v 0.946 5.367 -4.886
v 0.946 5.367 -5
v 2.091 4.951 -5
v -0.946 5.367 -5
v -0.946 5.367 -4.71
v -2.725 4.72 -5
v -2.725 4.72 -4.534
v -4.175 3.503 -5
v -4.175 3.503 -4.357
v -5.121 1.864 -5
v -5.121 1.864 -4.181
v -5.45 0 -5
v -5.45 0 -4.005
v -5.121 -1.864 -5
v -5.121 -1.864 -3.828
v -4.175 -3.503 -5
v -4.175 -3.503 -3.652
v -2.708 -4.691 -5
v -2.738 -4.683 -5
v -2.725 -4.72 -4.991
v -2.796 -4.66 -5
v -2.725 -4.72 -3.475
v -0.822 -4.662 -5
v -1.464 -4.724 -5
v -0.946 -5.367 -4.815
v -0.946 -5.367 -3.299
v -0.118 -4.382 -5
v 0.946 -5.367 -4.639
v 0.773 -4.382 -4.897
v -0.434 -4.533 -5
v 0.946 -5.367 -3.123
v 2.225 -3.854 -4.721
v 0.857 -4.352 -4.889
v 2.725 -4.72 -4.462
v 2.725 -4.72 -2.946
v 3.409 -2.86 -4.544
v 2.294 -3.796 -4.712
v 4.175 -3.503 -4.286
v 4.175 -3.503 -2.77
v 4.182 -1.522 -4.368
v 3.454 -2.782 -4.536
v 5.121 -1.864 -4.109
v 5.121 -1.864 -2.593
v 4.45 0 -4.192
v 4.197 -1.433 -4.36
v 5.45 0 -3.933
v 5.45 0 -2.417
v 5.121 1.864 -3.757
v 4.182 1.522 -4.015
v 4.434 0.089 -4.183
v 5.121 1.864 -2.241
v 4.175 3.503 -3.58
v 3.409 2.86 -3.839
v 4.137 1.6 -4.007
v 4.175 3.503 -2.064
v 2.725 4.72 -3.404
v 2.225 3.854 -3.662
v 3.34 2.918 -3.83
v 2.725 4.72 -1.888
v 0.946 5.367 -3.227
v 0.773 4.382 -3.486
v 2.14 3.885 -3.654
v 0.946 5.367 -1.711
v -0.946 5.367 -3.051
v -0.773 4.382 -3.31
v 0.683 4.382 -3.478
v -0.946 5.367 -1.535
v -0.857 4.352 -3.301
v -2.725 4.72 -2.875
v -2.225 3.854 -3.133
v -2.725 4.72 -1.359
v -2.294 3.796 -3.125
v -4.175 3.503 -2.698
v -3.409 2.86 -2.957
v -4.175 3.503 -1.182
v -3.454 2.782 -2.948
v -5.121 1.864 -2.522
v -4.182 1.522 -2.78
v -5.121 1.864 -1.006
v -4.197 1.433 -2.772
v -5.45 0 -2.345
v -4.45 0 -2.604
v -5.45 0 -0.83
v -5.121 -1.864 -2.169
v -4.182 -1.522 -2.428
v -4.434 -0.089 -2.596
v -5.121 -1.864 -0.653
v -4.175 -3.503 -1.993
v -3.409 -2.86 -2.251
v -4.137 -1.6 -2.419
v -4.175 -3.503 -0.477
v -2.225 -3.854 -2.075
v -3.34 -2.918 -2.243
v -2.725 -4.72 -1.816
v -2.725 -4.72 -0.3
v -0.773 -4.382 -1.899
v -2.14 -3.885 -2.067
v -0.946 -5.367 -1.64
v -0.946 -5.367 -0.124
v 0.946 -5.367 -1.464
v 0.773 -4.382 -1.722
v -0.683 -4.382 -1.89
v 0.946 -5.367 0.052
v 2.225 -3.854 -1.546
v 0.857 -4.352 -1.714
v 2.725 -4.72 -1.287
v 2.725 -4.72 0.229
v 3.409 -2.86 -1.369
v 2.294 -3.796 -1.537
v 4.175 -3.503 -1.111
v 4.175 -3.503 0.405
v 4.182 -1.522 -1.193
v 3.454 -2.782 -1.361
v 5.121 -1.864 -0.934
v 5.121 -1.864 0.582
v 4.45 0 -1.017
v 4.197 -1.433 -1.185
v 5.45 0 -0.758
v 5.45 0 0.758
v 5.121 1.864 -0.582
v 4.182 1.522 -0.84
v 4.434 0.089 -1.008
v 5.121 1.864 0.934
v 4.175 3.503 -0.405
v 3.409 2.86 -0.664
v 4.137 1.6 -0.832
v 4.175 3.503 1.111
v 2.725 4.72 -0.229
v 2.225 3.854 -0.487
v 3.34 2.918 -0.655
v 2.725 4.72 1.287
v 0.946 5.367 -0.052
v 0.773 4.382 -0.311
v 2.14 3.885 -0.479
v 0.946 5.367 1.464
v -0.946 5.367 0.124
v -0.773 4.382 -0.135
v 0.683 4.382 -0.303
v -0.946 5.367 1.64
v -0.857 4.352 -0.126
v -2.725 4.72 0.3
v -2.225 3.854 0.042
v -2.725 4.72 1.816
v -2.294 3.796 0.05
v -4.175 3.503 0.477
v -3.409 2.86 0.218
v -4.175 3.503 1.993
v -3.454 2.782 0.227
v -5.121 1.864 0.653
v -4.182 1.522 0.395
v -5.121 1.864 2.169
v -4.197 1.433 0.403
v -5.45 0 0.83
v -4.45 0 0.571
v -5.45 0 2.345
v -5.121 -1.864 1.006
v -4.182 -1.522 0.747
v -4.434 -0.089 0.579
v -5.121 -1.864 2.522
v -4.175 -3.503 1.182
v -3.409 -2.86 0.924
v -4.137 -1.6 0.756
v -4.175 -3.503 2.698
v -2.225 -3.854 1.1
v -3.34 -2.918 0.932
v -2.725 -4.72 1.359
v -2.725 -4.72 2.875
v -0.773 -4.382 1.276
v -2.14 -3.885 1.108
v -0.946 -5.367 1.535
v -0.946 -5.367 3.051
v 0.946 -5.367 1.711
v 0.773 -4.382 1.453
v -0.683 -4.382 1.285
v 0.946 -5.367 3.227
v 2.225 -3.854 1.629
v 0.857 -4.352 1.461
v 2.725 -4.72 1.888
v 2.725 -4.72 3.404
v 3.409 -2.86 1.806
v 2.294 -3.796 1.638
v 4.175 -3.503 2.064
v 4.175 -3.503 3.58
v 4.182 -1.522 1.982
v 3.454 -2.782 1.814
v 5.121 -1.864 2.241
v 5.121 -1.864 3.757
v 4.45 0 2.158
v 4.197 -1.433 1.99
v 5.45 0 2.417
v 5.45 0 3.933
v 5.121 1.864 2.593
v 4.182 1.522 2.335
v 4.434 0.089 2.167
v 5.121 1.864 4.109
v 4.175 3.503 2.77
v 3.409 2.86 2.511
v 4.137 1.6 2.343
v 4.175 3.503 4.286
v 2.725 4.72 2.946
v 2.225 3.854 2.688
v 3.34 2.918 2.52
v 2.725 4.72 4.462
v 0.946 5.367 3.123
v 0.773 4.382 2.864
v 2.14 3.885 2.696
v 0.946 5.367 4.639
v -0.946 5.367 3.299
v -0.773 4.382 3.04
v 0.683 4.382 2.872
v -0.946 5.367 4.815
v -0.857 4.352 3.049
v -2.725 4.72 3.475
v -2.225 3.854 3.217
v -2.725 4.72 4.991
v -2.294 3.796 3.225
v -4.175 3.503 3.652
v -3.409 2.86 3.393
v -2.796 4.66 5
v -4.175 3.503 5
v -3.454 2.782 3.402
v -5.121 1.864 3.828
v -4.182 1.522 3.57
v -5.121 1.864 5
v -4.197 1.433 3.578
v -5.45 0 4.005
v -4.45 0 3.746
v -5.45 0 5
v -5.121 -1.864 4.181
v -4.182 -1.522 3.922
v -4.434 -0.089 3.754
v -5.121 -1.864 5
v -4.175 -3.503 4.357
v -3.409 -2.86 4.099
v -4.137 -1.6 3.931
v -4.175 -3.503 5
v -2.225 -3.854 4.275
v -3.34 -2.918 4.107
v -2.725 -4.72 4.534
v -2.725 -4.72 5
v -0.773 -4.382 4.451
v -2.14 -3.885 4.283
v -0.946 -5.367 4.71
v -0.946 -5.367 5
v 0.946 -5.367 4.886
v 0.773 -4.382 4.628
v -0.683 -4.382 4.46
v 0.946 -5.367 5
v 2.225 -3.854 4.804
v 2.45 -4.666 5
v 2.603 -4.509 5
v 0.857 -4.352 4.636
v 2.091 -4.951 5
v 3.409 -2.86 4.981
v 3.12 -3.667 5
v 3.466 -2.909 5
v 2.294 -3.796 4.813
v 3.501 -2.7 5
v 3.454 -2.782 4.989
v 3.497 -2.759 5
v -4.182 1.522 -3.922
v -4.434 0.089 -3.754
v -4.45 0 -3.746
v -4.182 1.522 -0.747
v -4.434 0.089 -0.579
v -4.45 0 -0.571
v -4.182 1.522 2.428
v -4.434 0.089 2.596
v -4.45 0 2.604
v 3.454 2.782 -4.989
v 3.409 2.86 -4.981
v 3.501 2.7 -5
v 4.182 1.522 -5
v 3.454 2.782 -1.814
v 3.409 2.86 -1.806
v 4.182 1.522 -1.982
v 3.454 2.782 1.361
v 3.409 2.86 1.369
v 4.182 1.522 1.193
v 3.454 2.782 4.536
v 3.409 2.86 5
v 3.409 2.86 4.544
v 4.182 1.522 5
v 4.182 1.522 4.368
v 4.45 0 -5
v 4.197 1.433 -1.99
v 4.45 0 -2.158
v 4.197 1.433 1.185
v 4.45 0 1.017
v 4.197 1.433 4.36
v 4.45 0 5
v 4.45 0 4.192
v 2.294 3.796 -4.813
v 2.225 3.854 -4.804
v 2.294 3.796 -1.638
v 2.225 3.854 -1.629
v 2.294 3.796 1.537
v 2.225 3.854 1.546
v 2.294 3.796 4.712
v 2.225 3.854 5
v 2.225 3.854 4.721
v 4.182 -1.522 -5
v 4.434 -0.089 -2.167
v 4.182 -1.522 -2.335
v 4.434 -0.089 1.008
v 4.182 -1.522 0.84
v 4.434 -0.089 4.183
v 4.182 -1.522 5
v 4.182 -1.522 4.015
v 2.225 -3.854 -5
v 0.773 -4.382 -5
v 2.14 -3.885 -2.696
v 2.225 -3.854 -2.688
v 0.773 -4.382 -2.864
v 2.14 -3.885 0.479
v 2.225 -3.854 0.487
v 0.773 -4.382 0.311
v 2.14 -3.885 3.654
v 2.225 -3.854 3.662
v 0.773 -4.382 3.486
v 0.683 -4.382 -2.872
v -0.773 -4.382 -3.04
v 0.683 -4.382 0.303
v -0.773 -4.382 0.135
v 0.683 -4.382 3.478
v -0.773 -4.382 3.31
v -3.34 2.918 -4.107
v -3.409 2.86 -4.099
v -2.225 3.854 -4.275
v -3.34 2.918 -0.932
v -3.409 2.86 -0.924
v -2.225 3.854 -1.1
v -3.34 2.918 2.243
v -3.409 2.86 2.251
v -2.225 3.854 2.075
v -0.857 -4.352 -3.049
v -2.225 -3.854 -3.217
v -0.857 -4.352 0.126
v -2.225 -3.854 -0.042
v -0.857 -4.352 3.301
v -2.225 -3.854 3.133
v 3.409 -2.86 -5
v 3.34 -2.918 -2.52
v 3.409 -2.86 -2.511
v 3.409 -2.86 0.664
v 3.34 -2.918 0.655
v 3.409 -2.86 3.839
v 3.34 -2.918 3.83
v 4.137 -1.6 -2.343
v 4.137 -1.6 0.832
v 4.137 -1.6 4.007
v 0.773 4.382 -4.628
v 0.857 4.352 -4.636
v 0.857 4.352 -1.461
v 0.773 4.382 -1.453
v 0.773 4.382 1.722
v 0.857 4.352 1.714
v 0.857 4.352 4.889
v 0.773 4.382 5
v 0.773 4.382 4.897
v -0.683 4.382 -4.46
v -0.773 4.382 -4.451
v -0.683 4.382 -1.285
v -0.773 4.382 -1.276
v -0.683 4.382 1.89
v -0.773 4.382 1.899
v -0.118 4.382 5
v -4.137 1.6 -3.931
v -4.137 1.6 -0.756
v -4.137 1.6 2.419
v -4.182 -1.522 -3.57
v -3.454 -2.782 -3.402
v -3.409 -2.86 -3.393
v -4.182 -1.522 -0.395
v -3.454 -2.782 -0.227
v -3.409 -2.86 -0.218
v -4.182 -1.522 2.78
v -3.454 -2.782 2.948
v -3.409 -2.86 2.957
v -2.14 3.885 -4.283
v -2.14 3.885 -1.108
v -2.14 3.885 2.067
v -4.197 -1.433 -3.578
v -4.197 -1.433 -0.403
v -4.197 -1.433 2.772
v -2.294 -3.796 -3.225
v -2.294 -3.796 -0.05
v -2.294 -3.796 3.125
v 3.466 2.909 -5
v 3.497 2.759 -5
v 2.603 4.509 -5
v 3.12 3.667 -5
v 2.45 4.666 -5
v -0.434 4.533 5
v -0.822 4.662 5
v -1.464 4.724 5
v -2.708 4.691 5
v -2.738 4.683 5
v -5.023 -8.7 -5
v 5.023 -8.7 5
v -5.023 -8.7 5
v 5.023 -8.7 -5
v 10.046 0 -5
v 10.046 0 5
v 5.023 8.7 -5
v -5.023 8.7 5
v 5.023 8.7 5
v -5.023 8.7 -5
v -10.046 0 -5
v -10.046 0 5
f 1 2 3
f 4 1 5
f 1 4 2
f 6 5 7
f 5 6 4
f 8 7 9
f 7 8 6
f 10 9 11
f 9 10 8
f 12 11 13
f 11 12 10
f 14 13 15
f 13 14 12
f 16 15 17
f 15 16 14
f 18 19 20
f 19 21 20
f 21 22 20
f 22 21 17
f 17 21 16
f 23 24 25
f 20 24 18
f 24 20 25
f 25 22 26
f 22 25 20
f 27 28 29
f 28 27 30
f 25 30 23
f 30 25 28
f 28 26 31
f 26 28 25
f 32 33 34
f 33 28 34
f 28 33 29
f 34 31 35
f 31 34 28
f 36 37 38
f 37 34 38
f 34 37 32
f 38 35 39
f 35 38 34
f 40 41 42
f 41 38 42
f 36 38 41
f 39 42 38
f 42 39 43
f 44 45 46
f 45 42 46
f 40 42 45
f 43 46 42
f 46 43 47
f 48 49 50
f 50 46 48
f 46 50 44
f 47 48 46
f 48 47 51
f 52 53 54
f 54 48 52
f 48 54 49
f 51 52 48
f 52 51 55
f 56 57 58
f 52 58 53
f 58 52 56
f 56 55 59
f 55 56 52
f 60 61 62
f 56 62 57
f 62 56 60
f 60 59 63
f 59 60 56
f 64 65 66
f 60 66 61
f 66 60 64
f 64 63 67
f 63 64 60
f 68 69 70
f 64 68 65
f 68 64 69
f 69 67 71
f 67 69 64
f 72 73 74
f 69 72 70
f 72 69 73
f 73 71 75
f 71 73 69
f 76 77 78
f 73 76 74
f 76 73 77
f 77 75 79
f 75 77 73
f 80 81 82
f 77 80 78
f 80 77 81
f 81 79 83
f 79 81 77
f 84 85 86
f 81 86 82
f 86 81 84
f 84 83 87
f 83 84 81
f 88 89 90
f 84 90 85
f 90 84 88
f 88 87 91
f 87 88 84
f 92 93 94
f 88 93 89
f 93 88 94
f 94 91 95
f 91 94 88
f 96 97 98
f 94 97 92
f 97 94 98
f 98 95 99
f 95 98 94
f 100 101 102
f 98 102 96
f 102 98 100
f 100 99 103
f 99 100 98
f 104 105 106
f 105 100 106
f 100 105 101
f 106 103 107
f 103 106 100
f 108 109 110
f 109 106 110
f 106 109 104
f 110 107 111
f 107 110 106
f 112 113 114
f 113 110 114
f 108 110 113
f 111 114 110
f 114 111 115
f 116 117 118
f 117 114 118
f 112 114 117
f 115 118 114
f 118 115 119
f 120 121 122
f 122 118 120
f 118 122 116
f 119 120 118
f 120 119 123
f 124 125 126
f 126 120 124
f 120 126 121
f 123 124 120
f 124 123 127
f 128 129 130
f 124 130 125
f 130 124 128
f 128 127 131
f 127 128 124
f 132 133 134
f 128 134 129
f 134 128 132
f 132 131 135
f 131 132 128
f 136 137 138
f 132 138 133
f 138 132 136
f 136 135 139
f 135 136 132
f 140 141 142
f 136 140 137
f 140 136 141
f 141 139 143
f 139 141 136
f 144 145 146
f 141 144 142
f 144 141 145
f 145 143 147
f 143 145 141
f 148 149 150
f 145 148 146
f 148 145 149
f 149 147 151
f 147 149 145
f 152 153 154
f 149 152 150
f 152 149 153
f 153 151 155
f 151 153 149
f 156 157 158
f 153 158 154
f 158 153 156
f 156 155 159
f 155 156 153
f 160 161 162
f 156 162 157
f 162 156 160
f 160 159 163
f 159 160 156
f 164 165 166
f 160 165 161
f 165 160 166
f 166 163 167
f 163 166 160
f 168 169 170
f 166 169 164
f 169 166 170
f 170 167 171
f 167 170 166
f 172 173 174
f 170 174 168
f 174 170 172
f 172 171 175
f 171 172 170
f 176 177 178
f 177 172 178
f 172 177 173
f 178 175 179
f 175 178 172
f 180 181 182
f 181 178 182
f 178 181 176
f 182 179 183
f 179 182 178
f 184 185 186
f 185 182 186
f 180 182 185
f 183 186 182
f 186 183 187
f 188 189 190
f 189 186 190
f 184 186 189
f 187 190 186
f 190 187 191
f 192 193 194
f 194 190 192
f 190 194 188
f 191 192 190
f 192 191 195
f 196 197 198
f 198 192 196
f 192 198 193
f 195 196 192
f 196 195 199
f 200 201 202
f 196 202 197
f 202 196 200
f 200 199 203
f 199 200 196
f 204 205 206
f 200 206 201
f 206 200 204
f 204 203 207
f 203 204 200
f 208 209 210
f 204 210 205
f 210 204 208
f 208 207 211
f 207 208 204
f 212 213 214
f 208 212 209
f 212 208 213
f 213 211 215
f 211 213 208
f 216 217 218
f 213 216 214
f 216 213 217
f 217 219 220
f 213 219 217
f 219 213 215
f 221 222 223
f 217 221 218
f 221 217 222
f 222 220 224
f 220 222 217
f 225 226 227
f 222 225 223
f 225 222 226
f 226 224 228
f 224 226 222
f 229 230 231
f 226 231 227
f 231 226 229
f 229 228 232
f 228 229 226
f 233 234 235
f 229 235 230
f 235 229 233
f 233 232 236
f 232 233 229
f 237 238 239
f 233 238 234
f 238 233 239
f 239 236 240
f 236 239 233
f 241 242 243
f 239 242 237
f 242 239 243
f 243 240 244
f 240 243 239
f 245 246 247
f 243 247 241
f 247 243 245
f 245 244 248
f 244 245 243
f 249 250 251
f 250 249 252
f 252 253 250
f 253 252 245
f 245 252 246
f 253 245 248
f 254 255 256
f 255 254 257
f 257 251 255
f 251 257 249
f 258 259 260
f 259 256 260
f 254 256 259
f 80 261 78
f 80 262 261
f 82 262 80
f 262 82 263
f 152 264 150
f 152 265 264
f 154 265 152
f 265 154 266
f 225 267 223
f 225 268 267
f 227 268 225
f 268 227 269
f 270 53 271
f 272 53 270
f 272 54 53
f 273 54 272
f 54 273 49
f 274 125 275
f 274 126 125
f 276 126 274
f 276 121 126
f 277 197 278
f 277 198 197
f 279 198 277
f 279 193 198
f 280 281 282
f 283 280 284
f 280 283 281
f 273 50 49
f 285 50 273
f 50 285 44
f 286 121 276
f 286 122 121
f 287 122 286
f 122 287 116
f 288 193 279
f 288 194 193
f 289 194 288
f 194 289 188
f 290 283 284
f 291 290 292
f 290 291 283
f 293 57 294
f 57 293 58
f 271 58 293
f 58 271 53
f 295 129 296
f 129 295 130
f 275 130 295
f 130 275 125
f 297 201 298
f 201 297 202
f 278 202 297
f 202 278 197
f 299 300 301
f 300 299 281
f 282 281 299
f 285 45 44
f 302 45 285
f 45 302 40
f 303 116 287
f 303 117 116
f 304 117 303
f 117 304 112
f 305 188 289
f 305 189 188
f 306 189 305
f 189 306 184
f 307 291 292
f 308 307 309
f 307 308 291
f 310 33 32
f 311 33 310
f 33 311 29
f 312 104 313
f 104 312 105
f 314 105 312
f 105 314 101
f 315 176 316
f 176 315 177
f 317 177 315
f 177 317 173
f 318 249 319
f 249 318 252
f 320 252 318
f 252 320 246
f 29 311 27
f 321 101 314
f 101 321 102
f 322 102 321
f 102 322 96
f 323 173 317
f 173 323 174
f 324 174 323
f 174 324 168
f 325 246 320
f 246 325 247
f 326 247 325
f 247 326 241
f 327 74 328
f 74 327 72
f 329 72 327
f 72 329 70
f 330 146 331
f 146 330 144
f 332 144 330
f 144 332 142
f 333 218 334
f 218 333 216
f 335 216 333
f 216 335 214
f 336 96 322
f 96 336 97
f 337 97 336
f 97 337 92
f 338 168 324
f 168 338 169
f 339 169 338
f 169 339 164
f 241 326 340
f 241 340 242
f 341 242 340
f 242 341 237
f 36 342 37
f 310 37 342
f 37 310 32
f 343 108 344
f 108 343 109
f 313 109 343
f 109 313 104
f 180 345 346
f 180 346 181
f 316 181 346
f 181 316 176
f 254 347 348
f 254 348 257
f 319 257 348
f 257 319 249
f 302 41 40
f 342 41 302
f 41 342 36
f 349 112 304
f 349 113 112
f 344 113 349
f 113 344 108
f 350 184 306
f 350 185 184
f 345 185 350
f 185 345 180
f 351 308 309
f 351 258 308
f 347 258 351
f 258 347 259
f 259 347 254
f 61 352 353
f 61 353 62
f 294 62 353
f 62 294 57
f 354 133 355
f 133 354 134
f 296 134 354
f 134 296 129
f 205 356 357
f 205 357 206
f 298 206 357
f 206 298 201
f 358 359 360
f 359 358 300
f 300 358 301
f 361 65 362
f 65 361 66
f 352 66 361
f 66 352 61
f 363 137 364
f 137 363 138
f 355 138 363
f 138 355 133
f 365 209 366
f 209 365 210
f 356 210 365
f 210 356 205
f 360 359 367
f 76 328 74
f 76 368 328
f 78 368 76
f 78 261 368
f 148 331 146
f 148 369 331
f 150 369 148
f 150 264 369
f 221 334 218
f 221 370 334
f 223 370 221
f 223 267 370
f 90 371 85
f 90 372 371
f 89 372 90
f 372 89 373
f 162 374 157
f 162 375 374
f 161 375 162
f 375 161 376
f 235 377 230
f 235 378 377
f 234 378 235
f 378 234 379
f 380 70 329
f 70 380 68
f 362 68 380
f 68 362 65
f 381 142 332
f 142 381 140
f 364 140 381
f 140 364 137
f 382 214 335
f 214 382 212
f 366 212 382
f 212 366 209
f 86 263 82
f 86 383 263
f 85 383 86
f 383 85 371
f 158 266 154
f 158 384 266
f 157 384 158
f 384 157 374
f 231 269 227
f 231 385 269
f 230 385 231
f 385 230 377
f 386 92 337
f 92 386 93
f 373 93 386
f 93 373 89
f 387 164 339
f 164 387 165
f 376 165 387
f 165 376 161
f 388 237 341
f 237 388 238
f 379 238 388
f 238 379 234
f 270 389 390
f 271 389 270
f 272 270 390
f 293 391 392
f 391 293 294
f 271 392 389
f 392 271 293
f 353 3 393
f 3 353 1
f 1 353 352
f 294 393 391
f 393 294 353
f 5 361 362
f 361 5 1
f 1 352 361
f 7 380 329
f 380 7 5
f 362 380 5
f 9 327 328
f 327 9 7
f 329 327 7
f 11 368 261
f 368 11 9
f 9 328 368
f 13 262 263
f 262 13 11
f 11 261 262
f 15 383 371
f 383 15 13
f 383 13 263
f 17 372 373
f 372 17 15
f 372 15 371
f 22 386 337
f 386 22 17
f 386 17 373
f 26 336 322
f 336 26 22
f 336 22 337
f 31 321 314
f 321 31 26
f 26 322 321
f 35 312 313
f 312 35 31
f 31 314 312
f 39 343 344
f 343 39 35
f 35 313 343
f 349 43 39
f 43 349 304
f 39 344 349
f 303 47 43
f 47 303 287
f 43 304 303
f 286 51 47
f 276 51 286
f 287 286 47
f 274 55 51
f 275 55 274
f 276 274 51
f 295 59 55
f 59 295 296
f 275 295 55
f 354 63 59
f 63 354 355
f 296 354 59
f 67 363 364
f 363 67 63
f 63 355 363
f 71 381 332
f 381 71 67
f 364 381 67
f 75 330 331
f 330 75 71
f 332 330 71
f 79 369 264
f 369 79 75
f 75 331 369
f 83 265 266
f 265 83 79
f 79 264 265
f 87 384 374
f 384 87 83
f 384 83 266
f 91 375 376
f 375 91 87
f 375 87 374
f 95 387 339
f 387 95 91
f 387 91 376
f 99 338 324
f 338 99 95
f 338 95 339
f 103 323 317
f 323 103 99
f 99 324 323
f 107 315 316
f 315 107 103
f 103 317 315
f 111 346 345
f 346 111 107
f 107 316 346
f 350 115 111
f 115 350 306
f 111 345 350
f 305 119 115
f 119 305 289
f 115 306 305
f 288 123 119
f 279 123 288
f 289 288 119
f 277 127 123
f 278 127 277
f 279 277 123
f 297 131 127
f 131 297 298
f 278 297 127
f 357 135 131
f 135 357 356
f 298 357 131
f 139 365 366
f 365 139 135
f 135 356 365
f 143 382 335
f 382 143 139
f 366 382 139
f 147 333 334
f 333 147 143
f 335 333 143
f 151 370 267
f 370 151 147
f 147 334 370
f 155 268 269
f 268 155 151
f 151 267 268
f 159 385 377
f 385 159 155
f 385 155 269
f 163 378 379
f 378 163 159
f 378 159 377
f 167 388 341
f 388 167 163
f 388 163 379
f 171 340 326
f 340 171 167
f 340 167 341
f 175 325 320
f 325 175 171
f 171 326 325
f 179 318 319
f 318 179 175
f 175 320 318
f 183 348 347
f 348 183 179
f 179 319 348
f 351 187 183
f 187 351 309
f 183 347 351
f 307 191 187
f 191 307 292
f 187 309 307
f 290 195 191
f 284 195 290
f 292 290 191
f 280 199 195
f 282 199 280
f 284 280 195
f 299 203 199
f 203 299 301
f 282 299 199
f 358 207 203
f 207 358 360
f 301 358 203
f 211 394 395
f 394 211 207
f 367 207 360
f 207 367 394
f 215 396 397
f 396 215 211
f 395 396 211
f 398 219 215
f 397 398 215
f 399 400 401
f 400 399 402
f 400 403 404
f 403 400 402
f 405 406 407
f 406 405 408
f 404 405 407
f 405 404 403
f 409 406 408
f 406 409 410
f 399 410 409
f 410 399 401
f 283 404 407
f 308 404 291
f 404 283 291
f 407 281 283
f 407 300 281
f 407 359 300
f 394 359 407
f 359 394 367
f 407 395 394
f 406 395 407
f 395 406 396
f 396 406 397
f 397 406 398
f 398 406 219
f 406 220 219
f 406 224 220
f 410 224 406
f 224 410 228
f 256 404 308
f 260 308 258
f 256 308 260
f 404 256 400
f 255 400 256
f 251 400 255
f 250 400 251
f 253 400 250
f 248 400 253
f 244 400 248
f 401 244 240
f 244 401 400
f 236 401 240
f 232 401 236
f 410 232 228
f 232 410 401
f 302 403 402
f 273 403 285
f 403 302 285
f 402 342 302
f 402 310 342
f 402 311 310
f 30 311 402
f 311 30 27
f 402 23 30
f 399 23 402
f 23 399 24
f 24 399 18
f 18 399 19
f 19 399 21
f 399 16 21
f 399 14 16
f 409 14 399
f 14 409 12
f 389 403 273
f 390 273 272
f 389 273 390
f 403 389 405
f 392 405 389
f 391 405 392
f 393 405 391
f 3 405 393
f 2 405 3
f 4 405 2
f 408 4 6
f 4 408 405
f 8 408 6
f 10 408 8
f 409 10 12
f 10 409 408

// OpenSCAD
// file: math.scad
//////////////////////////////////////////////////////////////////////
// Math helper functions.
//////////////////////////////////////////////////////////////////////

/*
BSD 2-Clause License

Copyright (c) 2017, Revar Desmera
All rights reserved.

Redistribution and use in source and binary forms, with or without
modification, are permitted provided that the following conditions are met:

* Redistributions of source code must retain the above copyright notice, this
  list of conditions and the following disclaimer.

* Redistributions in binary form must reproduce the above copyright notice,
  this list of conditions and the following disclaimer in the documentation
  and/or other materials provided with the distribution.

THIS SOFTWARE IS PROVIDED BY THE COPYRIGHT HOLDERS AND CONTRIBUTORS "AS IS"
AND ANY EXPRESS OR IMPLIED WARRANTIES, INCLUDING, BUT NOT LIMITED TO, THE
IMPLIED WARRANTIES OF MERCHANTABILITY AND FITNESS FOR A PARTICULAR PURPOSE ARE
DISCLAIMED. IN NO EVENT SHALL THE COPYRIGHT HOLDER OR CONTRIBUTORS BE LIABLE
FOR ANY DIRECT, INDIRECT, INCIDENTAL, SPECIAL, EXEMPLARY, OR CONSEQUENTIAL
DAMAGES (INCLUDING, BUT NOT LIMITED TO, PROCUREMENT OF SUBSTITUTE GOODS OR
SERVICES; LOSS OF USE, DATA, OR PROFITS; OR BUSINESS INTERRUPTION) HOWEVER
CAUSED AND ON ANY THEORY OF LIABILITY, WHETHER IN CONTRACT, STRICT LIABILITY,
OR TORT (INCLUDING NEGLIGENCE OR OTHERWISE) ARISING IN ANY WAY OUT OF THE USE
OF THIS SOFTWARE, EVEN IF ADVISED OF THE POSSIBILITY OF SUCH DAMAGE.
*/


function Cpi() = 3.141592653589793236;


// Quantize a value x to an integer multiple of y, rounding to the nearest multiple.
function quant(x,y) = floor(x/y+0.5)*y;


// Quantize a value x to an integer multiple of y, rounding down to the previous multiple.
function quantdn(x,y) = floor(x/y)*y;


// Quantize a value x to an integer multiple of y, rounding up to the next multiple.
function quantup(x,y) = ceil(x/y)*y;


// Calculate OpenSCAD standard number of segments in a circle based on $fn, $fa, and $fs.
//   r = radius of circle to get the number of segments for.
function segs(r) = $fn>0?($fn>3?$fn:3):(ceil(max(min(360.0/$fa,abs(r)*2*Cpi()/$fs),5)));


// Calculate hypotenuse length of 2D triangle.
function hypot(x,y) = sqrt(x*x+y*y);


// Calculate hypotenuse length of 3D triangle.
function hypot3(x,y,z) = sqrt(x*x+y*y+z*z);


// Returns all but the first item of a given array.
function cdr(list) = len(list)>1?[for (i=[1:len(list)-1]) list[i]]:[];


// Reverses a list/array.
function reverse(list) = [ for (i = [len(list)-1 : -1 : 0]) list[i] ];


// Returns the sum of the square of each element of a vector.
function sum_of_squares(v,n=0) = (n>=len(v))? 0 : ((v[n]*v[n]) + sum_of_squares(v,n+1));


// Returns a 3D vector/point from a 2D or 3D vector.
function point3d(p) = [p[0], p[1], ((len(p) < 3)? 0 : p[2])];


// Returns an array of 3D vectors/points from a 2D or 3D vector array.
function path3d(points) = [for (point = points) point3d(point)];


// Returns the distance between a pair of 2D or 3D points.
function distance(p1, p2) = let(d = point3d(p2) - point3d(p1)) hypot3(d[0], d[1], d[2]);


// Create an identity matrix, for a given number of axes.
function ident(n) = [for (i = [0:n-1]) [for (j = [0:n-1]) (i==j)?1:0]];


// Create an identity matrix, for 3 axes.
ident3 = ident(3);
ident4 = ident(4);


// Takes a 3x3 matrix and returns its 4x4 equivalent.
function mat3_to_mat4(m) = concat(
	[for (r = [0:2])
		concat(
			[for (c = [0:2]) m[r][c]],
			[0]
		)
	],
	[[0, 0, 0, 1]]
);


// Returns the 3x3 matrix to perform a rotation of a vector around the X axis.
//   ang = number of degrees to rotate.
function matrix3_xrot(ang) = [
	[1,        0,         0],
	[0, cos(ang), -sin(ang)],
	[0, sin(ang),  cos(ang)]
];


// Returns the 4x4 matrix to perform a rotation of a vector around the X axis.
//   ang = number of degrees to rotate.
function matrix4_xrot(ang) = mat3_to_mat4(matrix3_xrot(ang));


// Returns the 3x3 matrix to perform a rotation of a vector around the Y axis.
//   ang = number of degrees to rotate.
function matrix3_yrot(ang) = [
	[ cos(ang), 0, sin(ang)],
	[        0, 1,        0],
	[-sin(ang), 0, cos(ang)],
];


// Returns the 4x4 matrix to perform a rotation of a vector around the Y axis.
//   ang = number of degrees to rotate.
function matrix4_yrot(ang) = mat3_to_mat4(matrix3_yrot(ang));


// Returns the 3x3 matrix to perform a rotation of a vector around the Z axis.
//   ang = number of degrees to rotate.
function matrix3_zrot(ang) = [
	[cos(ang), -sin(ang), 0],
	[sin(ang),  cos(ang), 0],
	[       0,         0, 1]
];

// Returns the 4x4 matrix to perform a rotation of a vector around the Z axis.
//   ang = number of degrees to rotate.
function matrix4_zrot(ang) = mat3_to_mat4(matrix3_zrot(ang));


// Returns the 3x3 matrix to perform a rotation of a vector around an axis.
//   u = axis vector to rotate around.
//   ang = number of degrees to rotate.
function matrix3_rot_by_axis(u, ang) = let(
	c = cos(ang), c2 = 1-c, s = sin(ang)
) [
	[u[0]*u[0]*c2+c,      u[0]*u[1]*c2-u[2]*s, u[0]*u[2]*c2+u[1]*s],
	[u[1]*u[0]*c2+u[2]*s, u[1]*u[1]*c2+c,      u[1]*u[2]*c2-u[0]*s],
	[u[2]*u[0]*c2-u[1]*s, u[2]*u[1]*c2+u[0]*s, u[2]*u[2]*c2+c     ]
];


// Returns the 4x4 matrix to perform a rotation of a vector around an axis.
//   u = axis vector to rotate around.
//   ang = number of degrees to rotate.
function matrix4_rot_by_axis(u, ang) = mat3_to_mat4(matrix3_rot_by_axis(u, ang));


// Gives the sum of a series of sines, at a given angle.
//   a = angle to get the value for.
//   sines = array of [amplitude, frequency] pairs, where the frequency is the
//           number of times the cycle repeats around the circle.
function sum_of_sines(a,sines) = len(sines)==0? 0 :
	len(sines)==1?sines[0][0]*sin(a*sines[0][1]+(len(sines[0])>2?sines[0][2]:0)):
	sum_of_sines(a,[sines[0]])+sum_of_sines(a,cdr(sines));


// Returns unit length normalized version of vector v.
function normalize(v) = v/norm(v);

// Returns angle in degrees between two 2D vectors.
function vector2d_angle(v1,v2) = atan2(v1[1],v1[0]) - atan2(v2[1],v2[0]);

// Returns angle in degrees between two 3D vectors.
function vector3d_angle(v1,v2) = acos((v1*v2)/(norm(v1)*norm(v2)));

// Returns a slice of an array.  An index of 0 is the array start, -1 is array end
function slice(arr,st,end) = let(
		s=st<0?(len(arr)+st):st,
		e=end<0?(len(arr)+end+1):end
	) [for (i=[s:e-1]) if (e>s) arr[i]];



// vim: noexpandtab tabstop=4 shiftwidth=4 softtabstop=4 nowrap
// main file
//////////////////////////////////////////////////////////////////////
// Square-threaded (ACME) Screw Rods and Nuts
//////////////////////////////////////////////////////////////////////

/*
BSD 2-Clause License

Copyright (c) 2017, Revar Desmera
All rights reserved.

Redistribution and use in source and binary forms, with or without
modification, are permitted provided that the following conditions are met:

* Redistributions of source code must retain the above copyright notice, this
  list of conditions and the following disclaimer.

* Redistributions in binary form must reproduce the above copyright notice,
  this list of conditions and the following disclaimer in the documentation
  and/or other materials provided with the distribution.

THIS SOFTWARE IS PROVIDED BY THE COPYRIGHT HOLDERS AND CONTRIBUTORS "AS IS"
AND ANY EXPRESS OR IMPLIED WARRANTIES, INCLUDING, BUT NOT LIMITED TO, THE
IMPLIED WARRANTIES OF MERCHANTABILITY AND FITNESS FOR A PARTICULAR PURPOSE ARE
DISCLAIMED. IN NO EVENT SHALL THE COPYRIGHT HOLDER OR CONTRIBUTORS BE LIABLE
FOR ANY DIRECT, INDIRECT, INCIDENTAL, SPECIAL, EXEMPLARY, OR CONSEQUENTIAL
DAMAGES (INCLUDING, BUT NOT LIMITED TO, PROCUREMENT OF SUBSTITUTE GOODS OR
SERVICES; LOSS OF USE, DATA, OR PROFITS; OR BUSINESS INTERRUPTION) HOWEVER
CAUSED AND ON ANY THEORY OF LIABILITY, WHETHER IN CONTRACT, STRICT LIABILITY,
OR TORT (INCLUDING NEGLIGENCE OR OTHERWISE) ARISING IN ANY WAY OUT OF THE USE
OF THIS SOFTWARE, EVEN IF ADVISED OF THE POSSIBILITY OF SUCH DAMAGE.
*/

include <transforms.scad>
include <math.scad>


// Constructs an acme threaded screw rod.  This method makes much
//  smoother threads than the naive linear_extrude method.
module acme_threaded_rod(
	d=10.5,
	l=100,
	pitch=3.175,
	thread_depth=1,
	thread_angle=14.5
) {
	astep = 360/segs(d/2);
	asteps = ceil(360/astep);
	threads = ceil(l/pitch)+2;
	pa_delta = min(pitch/4.1,(thread_depth+0.05)*tan(thread_angle)/2);
	poly_points = [
		for (
			thread = [0 : threads-1],
			astep = [0 : asteps-1],
			i = [0 : 3]
		) let (
			r = max(0, d/2 - ((i==1||i==2)? 0 : (thread_depth+0.05))),
			a = astep / asteps,
			rx = r * cos(360 * a),
			ry = r * sin(360 * a),
			tz = (thread + a - threads/2 + (i<2? -0.25 : 0.25)) * pitch + (i%2==0? -pa_delta : pa_delta)
		) [rx, ry, tz]
	];
	point_count = len(poly_points);
	poly_faces = concat(
		[
			for (
				thread = [0 : threads-1],
				astep = [0 : asteps-1],
				j = [0 : 3],
				i = [0 : 1]
			) let(
				p0 = (thread*asteps + astep)*4 + j,
				p1 = p0 + 4,
				p2 = (thread*asteps + astep)*4 + ((j+1)%4),
				p3 = p2 + 4,
				tri = (i==0? [p0, p3, p1] : [p0, p2, p3])
			)
			if (p0 < point_count-4) tri
		],
		[
			[0, 3, 2],
			[0, 2, 1],
			[point_count-4, point_count-3, point_count-2],
			[point_count-4, point_count-2, point_count-1]
		]
	);
	intersection() {
		union() {
			polyhedron(points=poly_points, faces=poly_faces, convexity=10);
			cylinder(h=(threads+0.5)*pitch, d=d-2*thread_depth, center=true, $fn=asteps);
		}
		cube([d+1, d+1, l], center=true);
	}
}
//!acme_threaded_rod(d=3/8*25.4, l=20, pitch=1/8*25.4, thread_depth=1.3, thread_angle=29, $fn=32);
//!acme_threaded_rod(d=60, l=16, pitch=8, thread_depth=3, thread_angle=45, $fa=2, $fs=2);


module acme_threaded_nut(
	od=17.4,
	id=10.5,
	h=10,
	pitch=3.175,
	thread_depth=1,
	slop=printer_slop
) {
	difference() {
		cylinder(r=od/2/cos(30), h=h, center=true, $fn=6);
		zspread(slop, n=slop>0?2:1) {
			acme_threaded_rod(d=id+2*slop, l=h+1, pitch=pitch, thread_depth=thread_depth);
		}
	}
}

!acme_threaded_nut(od=17.4, id=10.5, h=10, pitch=3.175, thread_depth=1, slop=printer_slop);


// vim: noexpandtab tabstop=4 shiftwidth=4 softtabstop=4 nowrap
